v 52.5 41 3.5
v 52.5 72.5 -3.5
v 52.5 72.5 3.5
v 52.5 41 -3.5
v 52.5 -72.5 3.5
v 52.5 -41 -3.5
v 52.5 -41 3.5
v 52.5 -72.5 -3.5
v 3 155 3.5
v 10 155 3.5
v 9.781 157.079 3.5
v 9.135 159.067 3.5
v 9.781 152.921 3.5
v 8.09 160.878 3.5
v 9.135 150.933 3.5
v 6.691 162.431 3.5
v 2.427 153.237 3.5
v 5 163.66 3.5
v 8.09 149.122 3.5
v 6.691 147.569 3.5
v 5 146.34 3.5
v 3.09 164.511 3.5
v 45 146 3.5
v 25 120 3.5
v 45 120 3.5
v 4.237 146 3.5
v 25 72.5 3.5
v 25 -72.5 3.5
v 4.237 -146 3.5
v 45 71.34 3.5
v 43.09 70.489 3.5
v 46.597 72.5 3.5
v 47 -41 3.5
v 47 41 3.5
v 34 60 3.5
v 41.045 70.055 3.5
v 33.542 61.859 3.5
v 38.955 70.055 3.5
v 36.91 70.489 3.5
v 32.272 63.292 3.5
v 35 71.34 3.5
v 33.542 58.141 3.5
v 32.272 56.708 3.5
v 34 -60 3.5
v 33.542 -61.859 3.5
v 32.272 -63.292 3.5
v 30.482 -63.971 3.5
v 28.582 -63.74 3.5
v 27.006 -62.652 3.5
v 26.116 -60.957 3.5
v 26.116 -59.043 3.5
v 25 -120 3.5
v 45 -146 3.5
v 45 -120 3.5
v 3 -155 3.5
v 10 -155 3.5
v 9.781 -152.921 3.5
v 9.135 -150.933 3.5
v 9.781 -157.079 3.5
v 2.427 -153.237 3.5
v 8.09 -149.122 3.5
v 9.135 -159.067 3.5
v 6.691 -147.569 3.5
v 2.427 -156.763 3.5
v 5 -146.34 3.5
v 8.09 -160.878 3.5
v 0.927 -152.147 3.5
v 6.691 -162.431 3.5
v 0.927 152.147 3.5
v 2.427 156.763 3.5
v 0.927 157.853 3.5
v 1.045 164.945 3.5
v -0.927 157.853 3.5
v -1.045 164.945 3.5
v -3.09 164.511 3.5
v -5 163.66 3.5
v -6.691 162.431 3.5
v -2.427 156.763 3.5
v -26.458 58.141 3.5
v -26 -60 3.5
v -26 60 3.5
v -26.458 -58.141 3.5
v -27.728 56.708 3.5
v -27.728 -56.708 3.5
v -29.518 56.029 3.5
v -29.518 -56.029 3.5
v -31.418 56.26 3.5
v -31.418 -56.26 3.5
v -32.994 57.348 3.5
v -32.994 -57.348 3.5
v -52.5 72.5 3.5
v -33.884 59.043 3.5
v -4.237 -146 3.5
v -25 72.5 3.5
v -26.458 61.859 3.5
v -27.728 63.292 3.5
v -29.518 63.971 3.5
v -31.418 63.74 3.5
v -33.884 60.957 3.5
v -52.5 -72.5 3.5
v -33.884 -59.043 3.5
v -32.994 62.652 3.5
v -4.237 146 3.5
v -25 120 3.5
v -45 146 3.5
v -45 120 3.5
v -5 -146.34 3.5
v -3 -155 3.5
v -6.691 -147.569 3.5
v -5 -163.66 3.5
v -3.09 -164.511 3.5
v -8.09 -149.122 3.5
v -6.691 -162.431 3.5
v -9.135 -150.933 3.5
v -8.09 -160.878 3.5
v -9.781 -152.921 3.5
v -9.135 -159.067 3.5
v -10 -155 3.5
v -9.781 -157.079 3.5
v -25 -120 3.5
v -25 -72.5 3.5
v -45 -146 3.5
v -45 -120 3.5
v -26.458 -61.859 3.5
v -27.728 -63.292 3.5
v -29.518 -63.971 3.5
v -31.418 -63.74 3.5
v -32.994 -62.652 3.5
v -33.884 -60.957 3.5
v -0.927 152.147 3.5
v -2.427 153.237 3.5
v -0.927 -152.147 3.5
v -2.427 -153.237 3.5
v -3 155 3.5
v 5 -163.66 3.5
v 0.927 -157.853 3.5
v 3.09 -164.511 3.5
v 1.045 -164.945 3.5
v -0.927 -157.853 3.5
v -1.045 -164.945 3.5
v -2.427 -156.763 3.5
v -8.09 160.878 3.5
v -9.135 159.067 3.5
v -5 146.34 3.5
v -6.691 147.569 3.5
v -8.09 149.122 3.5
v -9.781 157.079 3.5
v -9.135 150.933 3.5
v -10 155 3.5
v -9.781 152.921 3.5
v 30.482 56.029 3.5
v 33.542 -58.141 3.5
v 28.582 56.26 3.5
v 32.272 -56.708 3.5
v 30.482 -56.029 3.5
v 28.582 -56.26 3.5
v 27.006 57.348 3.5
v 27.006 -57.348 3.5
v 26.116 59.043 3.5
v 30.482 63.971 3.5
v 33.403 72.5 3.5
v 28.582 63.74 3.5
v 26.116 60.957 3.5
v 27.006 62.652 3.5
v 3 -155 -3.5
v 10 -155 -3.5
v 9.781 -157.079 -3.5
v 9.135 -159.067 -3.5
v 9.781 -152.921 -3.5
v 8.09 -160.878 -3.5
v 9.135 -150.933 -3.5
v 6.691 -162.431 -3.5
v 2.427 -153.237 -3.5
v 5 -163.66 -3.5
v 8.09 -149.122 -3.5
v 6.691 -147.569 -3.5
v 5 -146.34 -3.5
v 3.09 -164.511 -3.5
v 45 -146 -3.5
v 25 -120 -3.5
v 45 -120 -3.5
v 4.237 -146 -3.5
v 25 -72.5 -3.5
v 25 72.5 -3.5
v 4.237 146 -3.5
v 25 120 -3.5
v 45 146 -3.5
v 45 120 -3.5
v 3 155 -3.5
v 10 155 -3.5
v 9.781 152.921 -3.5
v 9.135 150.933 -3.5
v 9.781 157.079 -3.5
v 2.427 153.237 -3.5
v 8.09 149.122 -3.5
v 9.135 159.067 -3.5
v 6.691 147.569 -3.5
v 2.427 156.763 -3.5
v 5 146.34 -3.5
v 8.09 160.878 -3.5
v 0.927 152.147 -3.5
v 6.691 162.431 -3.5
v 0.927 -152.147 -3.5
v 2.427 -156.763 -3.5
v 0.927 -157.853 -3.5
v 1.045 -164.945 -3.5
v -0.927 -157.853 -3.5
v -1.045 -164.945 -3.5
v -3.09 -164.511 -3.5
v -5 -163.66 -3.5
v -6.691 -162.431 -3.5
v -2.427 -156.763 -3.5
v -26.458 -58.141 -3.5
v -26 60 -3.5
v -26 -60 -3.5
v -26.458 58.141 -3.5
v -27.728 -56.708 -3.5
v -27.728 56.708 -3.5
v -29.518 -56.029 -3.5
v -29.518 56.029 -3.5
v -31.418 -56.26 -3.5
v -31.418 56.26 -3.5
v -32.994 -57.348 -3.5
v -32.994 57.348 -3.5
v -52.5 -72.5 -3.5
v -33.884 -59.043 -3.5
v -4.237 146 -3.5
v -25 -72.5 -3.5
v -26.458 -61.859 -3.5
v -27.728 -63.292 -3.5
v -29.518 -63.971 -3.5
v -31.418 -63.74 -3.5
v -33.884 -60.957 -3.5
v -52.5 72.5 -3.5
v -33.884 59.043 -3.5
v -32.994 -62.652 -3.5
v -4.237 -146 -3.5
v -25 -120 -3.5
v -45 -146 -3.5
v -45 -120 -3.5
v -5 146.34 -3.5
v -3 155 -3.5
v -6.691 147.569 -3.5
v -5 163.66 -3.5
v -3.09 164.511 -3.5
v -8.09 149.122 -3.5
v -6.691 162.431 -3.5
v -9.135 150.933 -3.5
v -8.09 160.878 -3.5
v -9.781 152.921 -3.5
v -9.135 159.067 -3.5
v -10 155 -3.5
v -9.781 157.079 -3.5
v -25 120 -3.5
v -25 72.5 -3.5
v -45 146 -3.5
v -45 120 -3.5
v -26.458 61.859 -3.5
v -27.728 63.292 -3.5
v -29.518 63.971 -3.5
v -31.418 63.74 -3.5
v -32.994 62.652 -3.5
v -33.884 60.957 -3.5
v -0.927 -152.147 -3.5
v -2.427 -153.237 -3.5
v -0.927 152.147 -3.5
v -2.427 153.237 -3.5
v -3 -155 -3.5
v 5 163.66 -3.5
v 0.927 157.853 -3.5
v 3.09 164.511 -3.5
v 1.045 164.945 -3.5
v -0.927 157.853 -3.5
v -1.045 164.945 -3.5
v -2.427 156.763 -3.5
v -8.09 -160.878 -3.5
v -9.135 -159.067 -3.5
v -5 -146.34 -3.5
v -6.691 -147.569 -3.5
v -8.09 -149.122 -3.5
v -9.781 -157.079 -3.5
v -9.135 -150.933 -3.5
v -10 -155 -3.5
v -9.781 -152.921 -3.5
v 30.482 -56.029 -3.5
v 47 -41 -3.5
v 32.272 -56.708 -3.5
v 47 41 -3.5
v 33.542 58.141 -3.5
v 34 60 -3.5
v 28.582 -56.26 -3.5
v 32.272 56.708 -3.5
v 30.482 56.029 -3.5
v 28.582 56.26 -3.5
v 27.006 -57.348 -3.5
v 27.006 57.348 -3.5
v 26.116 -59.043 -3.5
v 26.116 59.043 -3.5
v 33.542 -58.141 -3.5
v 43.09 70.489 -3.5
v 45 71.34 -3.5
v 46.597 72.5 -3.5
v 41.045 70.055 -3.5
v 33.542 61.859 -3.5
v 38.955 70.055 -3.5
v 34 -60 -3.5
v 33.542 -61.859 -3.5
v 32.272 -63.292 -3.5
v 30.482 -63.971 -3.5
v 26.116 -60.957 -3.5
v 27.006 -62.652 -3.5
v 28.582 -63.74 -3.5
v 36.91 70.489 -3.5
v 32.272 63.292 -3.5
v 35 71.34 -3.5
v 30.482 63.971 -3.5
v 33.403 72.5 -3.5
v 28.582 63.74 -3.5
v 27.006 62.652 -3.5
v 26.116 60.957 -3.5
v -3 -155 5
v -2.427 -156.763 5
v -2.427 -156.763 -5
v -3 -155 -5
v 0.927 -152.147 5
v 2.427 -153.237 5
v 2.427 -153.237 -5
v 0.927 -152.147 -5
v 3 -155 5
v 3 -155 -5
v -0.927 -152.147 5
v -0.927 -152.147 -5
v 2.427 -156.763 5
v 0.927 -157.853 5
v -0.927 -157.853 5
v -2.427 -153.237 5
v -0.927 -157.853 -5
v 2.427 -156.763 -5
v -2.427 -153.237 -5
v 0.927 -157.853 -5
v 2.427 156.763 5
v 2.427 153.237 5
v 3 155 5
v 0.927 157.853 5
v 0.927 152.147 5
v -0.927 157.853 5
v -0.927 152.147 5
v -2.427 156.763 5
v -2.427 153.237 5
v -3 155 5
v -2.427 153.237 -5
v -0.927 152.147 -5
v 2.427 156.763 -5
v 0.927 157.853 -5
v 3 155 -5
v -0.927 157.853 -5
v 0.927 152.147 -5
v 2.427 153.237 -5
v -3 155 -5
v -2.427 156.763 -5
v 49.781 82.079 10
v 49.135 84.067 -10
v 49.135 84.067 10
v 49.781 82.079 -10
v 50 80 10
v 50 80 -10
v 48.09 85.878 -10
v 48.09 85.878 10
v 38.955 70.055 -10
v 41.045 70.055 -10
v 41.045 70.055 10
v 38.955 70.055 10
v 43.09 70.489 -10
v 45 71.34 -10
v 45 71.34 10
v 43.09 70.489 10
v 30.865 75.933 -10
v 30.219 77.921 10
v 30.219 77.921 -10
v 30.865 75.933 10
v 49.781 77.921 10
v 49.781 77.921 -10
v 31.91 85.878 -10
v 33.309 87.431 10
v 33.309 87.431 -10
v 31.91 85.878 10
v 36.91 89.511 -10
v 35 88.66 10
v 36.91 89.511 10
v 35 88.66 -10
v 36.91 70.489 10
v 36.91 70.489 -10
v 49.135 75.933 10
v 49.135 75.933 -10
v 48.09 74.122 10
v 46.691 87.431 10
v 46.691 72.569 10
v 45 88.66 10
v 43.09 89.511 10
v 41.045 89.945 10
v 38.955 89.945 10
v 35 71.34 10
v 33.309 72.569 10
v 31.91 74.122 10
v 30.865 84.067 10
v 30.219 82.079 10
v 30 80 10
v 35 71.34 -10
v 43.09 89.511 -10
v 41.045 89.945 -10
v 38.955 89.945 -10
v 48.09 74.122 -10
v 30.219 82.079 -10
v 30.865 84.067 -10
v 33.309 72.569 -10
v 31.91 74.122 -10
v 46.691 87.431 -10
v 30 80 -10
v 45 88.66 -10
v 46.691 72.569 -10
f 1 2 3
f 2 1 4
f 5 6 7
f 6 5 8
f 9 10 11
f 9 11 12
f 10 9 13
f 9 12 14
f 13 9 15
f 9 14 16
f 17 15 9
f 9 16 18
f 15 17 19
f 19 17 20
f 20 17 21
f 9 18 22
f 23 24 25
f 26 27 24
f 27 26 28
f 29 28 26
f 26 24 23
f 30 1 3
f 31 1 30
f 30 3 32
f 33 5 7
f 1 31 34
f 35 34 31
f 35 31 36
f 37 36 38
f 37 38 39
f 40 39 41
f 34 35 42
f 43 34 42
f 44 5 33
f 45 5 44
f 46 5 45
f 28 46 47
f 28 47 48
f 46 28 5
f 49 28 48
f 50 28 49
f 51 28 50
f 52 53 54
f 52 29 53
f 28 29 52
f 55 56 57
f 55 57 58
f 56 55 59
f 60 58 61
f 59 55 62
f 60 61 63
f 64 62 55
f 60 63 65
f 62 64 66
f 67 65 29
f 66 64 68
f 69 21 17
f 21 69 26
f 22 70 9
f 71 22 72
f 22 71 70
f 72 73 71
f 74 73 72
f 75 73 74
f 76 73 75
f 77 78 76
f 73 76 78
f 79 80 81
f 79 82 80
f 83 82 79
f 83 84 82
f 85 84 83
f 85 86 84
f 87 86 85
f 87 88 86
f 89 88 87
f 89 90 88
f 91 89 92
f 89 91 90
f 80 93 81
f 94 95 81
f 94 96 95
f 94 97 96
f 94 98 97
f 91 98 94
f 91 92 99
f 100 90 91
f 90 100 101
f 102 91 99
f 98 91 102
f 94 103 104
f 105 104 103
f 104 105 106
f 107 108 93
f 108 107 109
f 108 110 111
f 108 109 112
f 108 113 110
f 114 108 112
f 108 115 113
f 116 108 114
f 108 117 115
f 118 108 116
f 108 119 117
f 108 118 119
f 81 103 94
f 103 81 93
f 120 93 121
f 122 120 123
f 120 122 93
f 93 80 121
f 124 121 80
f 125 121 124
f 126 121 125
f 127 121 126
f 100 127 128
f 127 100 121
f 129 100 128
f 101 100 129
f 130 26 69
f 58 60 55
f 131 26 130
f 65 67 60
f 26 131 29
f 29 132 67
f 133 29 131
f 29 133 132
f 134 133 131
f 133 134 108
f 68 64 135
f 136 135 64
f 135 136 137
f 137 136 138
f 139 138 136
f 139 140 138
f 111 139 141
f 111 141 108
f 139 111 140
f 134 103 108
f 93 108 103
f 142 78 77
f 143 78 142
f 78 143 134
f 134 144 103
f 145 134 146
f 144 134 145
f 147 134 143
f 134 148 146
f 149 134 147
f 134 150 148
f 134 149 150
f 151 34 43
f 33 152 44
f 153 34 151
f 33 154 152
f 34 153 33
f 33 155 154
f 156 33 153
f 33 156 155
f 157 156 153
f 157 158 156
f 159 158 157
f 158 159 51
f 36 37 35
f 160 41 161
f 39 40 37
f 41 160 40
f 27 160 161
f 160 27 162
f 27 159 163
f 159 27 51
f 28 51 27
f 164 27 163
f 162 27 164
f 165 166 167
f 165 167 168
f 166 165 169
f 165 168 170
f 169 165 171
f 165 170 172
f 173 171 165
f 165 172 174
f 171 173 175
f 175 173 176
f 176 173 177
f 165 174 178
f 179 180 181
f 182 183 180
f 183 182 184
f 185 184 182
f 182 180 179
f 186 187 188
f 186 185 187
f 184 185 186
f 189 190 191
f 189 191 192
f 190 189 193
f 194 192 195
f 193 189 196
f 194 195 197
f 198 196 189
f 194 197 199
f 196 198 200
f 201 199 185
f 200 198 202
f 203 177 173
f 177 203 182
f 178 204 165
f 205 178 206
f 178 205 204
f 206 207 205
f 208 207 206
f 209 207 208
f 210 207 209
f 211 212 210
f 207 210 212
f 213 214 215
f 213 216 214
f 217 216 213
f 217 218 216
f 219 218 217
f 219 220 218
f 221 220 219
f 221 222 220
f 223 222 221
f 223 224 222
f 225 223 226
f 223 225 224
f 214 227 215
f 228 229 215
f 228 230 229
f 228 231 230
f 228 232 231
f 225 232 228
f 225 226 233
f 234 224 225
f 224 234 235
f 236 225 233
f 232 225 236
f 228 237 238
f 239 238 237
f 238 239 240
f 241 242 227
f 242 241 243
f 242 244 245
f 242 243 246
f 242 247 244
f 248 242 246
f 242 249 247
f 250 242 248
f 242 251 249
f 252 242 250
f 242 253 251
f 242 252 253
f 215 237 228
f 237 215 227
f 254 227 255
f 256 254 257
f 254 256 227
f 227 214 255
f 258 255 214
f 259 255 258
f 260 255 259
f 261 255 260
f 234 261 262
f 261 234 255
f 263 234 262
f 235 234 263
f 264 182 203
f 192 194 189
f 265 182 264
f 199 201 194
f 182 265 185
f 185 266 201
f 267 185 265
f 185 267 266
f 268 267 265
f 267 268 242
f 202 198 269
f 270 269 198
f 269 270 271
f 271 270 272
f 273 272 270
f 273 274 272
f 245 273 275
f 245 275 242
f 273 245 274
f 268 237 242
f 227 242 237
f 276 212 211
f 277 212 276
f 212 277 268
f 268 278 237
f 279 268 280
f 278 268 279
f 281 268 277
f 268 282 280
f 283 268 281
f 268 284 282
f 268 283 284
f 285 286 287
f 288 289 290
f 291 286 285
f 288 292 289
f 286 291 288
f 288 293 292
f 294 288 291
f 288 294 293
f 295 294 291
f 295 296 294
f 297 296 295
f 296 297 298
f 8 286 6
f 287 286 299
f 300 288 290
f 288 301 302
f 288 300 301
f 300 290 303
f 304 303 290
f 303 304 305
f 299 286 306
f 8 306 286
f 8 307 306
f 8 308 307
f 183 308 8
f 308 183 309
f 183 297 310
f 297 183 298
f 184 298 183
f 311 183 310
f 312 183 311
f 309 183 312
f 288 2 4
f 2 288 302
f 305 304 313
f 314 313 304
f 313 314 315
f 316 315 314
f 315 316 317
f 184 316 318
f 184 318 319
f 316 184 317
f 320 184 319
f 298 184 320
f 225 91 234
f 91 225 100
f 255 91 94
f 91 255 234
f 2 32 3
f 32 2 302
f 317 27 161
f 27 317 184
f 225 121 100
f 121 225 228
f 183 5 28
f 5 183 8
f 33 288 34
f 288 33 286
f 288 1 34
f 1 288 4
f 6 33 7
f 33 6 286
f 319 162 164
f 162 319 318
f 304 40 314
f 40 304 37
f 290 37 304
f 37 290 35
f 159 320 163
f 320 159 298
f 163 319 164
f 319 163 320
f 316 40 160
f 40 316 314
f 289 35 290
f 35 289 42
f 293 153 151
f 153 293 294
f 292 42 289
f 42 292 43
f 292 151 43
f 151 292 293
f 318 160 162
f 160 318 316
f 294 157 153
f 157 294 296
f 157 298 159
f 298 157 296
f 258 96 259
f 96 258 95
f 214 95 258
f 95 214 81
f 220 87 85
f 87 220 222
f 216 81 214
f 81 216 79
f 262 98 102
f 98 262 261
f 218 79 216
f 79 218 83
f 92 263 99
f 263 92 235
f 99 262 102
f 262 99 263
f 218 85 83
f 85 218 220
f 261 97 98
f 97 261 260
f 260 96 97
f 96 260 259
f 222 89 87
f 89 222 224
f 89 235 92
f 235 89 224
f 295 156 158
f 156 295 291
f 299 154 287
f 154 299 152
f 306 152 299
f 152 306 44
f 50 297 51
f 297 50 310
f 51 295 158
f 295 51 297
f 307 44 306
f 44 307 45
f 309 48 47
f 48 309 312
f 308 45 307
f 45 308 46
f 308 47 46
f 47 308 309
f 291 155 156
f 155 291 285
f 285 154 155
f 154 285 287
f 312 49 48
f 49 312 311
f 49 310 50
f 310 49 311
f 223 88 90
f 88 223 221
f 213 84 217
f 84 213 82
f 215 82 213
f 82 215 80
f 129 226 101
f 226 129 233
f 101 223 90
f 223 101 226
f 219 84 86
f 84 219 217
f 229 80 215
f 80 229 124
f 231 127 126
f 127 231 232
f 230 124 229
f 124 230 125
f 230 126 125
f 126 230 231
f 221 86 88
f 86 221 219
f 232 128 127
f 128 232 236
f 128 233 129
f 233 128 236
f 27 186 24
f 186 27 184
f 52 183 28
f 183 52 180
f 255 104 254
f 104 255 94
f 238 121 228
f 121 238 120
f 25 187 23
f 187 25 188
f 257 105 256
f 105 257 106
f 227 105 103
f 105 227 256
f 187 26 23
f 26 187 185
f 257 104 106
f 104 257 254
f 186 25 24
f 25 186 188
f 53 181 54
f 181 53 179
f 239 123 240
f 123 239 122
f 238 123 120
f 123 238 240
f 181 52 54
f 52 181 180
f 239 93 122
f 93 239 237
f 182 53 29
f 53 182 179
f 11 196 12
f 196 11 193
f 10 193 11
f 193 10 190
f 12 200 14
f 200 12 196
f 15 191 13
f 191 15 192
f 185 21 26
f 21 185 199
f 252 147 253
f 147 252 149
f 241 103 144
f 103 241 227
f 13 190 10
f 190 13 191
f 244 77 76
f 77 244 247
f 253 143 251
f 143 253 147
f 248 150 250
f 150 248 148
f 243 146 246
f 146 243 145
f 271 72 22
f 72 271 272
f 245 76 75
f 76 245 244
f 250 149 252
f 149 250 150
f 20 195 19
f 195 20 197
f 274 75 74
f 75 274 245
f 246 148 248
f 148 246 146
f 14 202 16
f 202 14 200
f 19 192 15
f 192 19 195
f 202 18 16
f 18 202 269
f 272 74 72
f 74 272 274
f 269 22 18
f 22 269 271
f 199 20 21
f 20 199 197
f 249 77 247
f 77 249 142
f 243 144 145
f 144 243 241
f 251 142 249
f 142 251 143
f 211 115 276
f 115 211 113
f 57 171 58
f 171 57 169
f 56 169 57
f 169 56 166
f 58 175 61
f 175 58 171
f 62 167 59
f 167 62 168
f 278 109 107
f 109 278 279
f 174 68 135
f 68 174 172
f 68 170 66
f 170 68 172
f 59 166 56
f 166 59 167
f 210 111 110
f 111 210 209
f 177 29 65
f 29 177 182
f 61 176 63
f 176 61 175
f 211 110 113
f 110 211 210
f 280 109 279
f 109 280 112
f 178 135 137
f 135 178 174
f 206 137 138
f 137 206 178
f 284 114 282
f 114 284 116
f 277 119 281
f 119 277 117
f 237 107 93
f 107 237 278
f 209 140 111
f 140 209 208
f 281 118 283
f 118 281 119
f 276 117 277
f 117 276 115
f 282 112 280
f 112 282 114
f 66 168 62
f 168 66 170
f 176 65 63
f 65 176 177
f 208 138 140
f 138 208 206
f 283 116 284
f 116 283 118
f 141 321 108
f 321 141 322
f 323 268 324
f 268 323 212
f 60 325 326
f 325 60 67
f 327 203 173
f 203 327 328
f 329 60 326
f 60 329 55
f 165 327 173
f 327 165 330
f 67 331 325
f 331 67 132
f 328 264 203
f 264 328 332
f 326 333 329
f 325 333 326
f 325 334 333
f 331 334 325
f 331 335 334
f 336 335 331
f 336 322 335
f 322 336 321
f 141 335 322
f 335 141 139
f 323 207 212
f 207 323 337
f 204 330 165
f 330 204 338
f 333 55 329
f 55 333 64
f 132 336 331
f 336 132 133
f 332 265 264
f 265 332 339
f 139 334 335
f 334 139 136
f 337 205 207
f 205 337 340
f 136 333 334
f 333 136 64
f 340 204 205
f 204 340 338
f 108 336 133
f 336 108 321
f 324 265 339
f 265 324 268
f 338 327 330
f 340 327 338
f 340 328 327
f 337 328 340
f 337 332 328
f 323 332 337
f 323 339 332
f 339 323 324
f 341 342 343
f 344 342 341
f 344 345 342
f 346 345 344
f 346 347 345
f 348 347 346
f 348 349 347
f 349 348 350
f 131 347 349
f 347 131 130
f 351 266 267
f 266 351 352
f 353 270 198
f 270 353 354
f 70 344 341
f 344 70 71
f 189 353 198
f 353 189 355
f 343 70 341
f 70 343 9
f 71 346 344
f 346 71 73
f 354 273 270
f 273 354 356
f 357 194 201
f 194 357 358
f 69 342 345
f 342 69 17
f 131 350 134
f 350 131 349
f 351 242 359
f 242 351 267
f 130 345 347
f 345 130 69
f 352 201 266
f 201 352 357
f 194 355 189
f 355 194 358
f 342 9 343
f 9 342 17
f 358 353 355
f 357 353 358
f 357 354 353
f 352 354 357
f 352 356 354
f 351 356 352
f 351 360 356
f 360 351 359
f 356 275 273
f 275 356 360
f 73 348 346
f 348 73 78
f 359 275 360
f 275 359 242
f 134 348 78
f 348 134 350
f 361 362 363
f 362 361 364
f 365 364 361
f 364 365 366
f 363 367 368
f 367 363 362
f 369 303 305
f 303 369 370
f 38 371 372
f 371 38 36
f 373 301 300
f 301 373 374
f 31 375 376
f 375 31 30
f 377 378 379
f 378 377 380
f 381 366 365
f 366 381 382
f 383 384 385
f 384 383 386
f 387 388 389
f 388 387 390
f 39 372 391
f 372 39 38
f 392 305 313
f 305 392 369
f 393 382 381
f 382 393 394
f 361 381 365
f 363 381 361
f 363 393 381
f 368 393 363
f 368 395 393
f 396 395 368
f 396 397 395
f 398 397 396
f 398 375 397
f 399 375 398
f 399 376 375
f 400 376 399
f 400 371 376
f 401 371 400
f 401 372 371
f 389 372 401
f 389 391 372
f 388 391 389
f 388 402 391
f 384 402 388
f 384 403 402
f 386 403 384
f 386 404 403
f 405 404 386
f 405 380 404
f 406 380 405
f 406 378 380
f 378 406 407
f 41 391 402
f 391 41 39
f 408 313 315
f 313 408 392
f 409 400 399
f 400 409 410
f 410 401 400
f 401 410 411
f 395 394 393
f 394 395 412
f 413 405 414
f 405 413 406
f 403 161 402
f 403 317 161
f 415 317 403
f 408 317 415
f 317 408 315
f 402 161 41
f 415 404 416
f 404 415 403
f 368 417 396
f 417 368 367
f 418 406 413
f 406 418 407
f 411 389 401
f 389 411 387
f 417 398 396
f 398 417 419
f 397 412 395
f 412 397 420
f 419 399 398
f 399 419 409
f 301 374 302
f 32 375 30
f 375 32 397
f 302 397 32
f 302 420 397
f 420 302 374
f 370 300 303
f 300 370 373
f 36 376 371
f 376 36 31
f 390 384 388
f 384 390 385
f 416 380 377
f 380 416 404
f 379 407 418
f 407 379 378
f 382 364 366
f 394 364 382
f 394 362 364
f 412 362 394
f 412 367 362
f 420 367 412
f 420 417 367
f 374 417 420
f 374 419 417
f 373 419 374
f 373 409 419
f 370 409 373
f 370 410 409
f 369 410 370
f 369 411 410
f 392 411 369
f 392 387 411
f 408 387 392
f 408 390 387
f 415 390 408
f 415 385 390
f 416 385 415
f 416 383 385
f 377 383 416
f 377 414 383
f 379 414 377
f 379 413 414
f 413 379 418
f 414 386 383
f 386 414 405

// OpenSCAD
cube([50,250,7],center=true);
difference(){
cube([105,145,7],center=true);
translate([57-5,0,0])cube([10,82,10],center=true);

translate([30,60,0])cylinder(d=8,10, center=true);
translate([-30,60,0])cylinder(d=8,10, center=true);
translate([30,-60,0])cylinder(d=8,10, center=true);
translate([-30,-60,0])cylinder(d=8,10, center=true);
  }
  
translate([0,138-5,0])cube([90,26,7],center=true);
translate([0,-138+5,0])cube([90,26,7],center=true);

translate([0,155,0])cylinder(d=20,h=7,center=true);
translate([0,-155,0])cylinder(d=20,h=7,center=true);
translate([0,-155,0])cylinder(d=6,h=10,center=true);
translate([0,155,0])cylinder(d=6,h=10,center=true);
  
  translate([40,80,0])cylinder(d=20,h=20,center=true);
